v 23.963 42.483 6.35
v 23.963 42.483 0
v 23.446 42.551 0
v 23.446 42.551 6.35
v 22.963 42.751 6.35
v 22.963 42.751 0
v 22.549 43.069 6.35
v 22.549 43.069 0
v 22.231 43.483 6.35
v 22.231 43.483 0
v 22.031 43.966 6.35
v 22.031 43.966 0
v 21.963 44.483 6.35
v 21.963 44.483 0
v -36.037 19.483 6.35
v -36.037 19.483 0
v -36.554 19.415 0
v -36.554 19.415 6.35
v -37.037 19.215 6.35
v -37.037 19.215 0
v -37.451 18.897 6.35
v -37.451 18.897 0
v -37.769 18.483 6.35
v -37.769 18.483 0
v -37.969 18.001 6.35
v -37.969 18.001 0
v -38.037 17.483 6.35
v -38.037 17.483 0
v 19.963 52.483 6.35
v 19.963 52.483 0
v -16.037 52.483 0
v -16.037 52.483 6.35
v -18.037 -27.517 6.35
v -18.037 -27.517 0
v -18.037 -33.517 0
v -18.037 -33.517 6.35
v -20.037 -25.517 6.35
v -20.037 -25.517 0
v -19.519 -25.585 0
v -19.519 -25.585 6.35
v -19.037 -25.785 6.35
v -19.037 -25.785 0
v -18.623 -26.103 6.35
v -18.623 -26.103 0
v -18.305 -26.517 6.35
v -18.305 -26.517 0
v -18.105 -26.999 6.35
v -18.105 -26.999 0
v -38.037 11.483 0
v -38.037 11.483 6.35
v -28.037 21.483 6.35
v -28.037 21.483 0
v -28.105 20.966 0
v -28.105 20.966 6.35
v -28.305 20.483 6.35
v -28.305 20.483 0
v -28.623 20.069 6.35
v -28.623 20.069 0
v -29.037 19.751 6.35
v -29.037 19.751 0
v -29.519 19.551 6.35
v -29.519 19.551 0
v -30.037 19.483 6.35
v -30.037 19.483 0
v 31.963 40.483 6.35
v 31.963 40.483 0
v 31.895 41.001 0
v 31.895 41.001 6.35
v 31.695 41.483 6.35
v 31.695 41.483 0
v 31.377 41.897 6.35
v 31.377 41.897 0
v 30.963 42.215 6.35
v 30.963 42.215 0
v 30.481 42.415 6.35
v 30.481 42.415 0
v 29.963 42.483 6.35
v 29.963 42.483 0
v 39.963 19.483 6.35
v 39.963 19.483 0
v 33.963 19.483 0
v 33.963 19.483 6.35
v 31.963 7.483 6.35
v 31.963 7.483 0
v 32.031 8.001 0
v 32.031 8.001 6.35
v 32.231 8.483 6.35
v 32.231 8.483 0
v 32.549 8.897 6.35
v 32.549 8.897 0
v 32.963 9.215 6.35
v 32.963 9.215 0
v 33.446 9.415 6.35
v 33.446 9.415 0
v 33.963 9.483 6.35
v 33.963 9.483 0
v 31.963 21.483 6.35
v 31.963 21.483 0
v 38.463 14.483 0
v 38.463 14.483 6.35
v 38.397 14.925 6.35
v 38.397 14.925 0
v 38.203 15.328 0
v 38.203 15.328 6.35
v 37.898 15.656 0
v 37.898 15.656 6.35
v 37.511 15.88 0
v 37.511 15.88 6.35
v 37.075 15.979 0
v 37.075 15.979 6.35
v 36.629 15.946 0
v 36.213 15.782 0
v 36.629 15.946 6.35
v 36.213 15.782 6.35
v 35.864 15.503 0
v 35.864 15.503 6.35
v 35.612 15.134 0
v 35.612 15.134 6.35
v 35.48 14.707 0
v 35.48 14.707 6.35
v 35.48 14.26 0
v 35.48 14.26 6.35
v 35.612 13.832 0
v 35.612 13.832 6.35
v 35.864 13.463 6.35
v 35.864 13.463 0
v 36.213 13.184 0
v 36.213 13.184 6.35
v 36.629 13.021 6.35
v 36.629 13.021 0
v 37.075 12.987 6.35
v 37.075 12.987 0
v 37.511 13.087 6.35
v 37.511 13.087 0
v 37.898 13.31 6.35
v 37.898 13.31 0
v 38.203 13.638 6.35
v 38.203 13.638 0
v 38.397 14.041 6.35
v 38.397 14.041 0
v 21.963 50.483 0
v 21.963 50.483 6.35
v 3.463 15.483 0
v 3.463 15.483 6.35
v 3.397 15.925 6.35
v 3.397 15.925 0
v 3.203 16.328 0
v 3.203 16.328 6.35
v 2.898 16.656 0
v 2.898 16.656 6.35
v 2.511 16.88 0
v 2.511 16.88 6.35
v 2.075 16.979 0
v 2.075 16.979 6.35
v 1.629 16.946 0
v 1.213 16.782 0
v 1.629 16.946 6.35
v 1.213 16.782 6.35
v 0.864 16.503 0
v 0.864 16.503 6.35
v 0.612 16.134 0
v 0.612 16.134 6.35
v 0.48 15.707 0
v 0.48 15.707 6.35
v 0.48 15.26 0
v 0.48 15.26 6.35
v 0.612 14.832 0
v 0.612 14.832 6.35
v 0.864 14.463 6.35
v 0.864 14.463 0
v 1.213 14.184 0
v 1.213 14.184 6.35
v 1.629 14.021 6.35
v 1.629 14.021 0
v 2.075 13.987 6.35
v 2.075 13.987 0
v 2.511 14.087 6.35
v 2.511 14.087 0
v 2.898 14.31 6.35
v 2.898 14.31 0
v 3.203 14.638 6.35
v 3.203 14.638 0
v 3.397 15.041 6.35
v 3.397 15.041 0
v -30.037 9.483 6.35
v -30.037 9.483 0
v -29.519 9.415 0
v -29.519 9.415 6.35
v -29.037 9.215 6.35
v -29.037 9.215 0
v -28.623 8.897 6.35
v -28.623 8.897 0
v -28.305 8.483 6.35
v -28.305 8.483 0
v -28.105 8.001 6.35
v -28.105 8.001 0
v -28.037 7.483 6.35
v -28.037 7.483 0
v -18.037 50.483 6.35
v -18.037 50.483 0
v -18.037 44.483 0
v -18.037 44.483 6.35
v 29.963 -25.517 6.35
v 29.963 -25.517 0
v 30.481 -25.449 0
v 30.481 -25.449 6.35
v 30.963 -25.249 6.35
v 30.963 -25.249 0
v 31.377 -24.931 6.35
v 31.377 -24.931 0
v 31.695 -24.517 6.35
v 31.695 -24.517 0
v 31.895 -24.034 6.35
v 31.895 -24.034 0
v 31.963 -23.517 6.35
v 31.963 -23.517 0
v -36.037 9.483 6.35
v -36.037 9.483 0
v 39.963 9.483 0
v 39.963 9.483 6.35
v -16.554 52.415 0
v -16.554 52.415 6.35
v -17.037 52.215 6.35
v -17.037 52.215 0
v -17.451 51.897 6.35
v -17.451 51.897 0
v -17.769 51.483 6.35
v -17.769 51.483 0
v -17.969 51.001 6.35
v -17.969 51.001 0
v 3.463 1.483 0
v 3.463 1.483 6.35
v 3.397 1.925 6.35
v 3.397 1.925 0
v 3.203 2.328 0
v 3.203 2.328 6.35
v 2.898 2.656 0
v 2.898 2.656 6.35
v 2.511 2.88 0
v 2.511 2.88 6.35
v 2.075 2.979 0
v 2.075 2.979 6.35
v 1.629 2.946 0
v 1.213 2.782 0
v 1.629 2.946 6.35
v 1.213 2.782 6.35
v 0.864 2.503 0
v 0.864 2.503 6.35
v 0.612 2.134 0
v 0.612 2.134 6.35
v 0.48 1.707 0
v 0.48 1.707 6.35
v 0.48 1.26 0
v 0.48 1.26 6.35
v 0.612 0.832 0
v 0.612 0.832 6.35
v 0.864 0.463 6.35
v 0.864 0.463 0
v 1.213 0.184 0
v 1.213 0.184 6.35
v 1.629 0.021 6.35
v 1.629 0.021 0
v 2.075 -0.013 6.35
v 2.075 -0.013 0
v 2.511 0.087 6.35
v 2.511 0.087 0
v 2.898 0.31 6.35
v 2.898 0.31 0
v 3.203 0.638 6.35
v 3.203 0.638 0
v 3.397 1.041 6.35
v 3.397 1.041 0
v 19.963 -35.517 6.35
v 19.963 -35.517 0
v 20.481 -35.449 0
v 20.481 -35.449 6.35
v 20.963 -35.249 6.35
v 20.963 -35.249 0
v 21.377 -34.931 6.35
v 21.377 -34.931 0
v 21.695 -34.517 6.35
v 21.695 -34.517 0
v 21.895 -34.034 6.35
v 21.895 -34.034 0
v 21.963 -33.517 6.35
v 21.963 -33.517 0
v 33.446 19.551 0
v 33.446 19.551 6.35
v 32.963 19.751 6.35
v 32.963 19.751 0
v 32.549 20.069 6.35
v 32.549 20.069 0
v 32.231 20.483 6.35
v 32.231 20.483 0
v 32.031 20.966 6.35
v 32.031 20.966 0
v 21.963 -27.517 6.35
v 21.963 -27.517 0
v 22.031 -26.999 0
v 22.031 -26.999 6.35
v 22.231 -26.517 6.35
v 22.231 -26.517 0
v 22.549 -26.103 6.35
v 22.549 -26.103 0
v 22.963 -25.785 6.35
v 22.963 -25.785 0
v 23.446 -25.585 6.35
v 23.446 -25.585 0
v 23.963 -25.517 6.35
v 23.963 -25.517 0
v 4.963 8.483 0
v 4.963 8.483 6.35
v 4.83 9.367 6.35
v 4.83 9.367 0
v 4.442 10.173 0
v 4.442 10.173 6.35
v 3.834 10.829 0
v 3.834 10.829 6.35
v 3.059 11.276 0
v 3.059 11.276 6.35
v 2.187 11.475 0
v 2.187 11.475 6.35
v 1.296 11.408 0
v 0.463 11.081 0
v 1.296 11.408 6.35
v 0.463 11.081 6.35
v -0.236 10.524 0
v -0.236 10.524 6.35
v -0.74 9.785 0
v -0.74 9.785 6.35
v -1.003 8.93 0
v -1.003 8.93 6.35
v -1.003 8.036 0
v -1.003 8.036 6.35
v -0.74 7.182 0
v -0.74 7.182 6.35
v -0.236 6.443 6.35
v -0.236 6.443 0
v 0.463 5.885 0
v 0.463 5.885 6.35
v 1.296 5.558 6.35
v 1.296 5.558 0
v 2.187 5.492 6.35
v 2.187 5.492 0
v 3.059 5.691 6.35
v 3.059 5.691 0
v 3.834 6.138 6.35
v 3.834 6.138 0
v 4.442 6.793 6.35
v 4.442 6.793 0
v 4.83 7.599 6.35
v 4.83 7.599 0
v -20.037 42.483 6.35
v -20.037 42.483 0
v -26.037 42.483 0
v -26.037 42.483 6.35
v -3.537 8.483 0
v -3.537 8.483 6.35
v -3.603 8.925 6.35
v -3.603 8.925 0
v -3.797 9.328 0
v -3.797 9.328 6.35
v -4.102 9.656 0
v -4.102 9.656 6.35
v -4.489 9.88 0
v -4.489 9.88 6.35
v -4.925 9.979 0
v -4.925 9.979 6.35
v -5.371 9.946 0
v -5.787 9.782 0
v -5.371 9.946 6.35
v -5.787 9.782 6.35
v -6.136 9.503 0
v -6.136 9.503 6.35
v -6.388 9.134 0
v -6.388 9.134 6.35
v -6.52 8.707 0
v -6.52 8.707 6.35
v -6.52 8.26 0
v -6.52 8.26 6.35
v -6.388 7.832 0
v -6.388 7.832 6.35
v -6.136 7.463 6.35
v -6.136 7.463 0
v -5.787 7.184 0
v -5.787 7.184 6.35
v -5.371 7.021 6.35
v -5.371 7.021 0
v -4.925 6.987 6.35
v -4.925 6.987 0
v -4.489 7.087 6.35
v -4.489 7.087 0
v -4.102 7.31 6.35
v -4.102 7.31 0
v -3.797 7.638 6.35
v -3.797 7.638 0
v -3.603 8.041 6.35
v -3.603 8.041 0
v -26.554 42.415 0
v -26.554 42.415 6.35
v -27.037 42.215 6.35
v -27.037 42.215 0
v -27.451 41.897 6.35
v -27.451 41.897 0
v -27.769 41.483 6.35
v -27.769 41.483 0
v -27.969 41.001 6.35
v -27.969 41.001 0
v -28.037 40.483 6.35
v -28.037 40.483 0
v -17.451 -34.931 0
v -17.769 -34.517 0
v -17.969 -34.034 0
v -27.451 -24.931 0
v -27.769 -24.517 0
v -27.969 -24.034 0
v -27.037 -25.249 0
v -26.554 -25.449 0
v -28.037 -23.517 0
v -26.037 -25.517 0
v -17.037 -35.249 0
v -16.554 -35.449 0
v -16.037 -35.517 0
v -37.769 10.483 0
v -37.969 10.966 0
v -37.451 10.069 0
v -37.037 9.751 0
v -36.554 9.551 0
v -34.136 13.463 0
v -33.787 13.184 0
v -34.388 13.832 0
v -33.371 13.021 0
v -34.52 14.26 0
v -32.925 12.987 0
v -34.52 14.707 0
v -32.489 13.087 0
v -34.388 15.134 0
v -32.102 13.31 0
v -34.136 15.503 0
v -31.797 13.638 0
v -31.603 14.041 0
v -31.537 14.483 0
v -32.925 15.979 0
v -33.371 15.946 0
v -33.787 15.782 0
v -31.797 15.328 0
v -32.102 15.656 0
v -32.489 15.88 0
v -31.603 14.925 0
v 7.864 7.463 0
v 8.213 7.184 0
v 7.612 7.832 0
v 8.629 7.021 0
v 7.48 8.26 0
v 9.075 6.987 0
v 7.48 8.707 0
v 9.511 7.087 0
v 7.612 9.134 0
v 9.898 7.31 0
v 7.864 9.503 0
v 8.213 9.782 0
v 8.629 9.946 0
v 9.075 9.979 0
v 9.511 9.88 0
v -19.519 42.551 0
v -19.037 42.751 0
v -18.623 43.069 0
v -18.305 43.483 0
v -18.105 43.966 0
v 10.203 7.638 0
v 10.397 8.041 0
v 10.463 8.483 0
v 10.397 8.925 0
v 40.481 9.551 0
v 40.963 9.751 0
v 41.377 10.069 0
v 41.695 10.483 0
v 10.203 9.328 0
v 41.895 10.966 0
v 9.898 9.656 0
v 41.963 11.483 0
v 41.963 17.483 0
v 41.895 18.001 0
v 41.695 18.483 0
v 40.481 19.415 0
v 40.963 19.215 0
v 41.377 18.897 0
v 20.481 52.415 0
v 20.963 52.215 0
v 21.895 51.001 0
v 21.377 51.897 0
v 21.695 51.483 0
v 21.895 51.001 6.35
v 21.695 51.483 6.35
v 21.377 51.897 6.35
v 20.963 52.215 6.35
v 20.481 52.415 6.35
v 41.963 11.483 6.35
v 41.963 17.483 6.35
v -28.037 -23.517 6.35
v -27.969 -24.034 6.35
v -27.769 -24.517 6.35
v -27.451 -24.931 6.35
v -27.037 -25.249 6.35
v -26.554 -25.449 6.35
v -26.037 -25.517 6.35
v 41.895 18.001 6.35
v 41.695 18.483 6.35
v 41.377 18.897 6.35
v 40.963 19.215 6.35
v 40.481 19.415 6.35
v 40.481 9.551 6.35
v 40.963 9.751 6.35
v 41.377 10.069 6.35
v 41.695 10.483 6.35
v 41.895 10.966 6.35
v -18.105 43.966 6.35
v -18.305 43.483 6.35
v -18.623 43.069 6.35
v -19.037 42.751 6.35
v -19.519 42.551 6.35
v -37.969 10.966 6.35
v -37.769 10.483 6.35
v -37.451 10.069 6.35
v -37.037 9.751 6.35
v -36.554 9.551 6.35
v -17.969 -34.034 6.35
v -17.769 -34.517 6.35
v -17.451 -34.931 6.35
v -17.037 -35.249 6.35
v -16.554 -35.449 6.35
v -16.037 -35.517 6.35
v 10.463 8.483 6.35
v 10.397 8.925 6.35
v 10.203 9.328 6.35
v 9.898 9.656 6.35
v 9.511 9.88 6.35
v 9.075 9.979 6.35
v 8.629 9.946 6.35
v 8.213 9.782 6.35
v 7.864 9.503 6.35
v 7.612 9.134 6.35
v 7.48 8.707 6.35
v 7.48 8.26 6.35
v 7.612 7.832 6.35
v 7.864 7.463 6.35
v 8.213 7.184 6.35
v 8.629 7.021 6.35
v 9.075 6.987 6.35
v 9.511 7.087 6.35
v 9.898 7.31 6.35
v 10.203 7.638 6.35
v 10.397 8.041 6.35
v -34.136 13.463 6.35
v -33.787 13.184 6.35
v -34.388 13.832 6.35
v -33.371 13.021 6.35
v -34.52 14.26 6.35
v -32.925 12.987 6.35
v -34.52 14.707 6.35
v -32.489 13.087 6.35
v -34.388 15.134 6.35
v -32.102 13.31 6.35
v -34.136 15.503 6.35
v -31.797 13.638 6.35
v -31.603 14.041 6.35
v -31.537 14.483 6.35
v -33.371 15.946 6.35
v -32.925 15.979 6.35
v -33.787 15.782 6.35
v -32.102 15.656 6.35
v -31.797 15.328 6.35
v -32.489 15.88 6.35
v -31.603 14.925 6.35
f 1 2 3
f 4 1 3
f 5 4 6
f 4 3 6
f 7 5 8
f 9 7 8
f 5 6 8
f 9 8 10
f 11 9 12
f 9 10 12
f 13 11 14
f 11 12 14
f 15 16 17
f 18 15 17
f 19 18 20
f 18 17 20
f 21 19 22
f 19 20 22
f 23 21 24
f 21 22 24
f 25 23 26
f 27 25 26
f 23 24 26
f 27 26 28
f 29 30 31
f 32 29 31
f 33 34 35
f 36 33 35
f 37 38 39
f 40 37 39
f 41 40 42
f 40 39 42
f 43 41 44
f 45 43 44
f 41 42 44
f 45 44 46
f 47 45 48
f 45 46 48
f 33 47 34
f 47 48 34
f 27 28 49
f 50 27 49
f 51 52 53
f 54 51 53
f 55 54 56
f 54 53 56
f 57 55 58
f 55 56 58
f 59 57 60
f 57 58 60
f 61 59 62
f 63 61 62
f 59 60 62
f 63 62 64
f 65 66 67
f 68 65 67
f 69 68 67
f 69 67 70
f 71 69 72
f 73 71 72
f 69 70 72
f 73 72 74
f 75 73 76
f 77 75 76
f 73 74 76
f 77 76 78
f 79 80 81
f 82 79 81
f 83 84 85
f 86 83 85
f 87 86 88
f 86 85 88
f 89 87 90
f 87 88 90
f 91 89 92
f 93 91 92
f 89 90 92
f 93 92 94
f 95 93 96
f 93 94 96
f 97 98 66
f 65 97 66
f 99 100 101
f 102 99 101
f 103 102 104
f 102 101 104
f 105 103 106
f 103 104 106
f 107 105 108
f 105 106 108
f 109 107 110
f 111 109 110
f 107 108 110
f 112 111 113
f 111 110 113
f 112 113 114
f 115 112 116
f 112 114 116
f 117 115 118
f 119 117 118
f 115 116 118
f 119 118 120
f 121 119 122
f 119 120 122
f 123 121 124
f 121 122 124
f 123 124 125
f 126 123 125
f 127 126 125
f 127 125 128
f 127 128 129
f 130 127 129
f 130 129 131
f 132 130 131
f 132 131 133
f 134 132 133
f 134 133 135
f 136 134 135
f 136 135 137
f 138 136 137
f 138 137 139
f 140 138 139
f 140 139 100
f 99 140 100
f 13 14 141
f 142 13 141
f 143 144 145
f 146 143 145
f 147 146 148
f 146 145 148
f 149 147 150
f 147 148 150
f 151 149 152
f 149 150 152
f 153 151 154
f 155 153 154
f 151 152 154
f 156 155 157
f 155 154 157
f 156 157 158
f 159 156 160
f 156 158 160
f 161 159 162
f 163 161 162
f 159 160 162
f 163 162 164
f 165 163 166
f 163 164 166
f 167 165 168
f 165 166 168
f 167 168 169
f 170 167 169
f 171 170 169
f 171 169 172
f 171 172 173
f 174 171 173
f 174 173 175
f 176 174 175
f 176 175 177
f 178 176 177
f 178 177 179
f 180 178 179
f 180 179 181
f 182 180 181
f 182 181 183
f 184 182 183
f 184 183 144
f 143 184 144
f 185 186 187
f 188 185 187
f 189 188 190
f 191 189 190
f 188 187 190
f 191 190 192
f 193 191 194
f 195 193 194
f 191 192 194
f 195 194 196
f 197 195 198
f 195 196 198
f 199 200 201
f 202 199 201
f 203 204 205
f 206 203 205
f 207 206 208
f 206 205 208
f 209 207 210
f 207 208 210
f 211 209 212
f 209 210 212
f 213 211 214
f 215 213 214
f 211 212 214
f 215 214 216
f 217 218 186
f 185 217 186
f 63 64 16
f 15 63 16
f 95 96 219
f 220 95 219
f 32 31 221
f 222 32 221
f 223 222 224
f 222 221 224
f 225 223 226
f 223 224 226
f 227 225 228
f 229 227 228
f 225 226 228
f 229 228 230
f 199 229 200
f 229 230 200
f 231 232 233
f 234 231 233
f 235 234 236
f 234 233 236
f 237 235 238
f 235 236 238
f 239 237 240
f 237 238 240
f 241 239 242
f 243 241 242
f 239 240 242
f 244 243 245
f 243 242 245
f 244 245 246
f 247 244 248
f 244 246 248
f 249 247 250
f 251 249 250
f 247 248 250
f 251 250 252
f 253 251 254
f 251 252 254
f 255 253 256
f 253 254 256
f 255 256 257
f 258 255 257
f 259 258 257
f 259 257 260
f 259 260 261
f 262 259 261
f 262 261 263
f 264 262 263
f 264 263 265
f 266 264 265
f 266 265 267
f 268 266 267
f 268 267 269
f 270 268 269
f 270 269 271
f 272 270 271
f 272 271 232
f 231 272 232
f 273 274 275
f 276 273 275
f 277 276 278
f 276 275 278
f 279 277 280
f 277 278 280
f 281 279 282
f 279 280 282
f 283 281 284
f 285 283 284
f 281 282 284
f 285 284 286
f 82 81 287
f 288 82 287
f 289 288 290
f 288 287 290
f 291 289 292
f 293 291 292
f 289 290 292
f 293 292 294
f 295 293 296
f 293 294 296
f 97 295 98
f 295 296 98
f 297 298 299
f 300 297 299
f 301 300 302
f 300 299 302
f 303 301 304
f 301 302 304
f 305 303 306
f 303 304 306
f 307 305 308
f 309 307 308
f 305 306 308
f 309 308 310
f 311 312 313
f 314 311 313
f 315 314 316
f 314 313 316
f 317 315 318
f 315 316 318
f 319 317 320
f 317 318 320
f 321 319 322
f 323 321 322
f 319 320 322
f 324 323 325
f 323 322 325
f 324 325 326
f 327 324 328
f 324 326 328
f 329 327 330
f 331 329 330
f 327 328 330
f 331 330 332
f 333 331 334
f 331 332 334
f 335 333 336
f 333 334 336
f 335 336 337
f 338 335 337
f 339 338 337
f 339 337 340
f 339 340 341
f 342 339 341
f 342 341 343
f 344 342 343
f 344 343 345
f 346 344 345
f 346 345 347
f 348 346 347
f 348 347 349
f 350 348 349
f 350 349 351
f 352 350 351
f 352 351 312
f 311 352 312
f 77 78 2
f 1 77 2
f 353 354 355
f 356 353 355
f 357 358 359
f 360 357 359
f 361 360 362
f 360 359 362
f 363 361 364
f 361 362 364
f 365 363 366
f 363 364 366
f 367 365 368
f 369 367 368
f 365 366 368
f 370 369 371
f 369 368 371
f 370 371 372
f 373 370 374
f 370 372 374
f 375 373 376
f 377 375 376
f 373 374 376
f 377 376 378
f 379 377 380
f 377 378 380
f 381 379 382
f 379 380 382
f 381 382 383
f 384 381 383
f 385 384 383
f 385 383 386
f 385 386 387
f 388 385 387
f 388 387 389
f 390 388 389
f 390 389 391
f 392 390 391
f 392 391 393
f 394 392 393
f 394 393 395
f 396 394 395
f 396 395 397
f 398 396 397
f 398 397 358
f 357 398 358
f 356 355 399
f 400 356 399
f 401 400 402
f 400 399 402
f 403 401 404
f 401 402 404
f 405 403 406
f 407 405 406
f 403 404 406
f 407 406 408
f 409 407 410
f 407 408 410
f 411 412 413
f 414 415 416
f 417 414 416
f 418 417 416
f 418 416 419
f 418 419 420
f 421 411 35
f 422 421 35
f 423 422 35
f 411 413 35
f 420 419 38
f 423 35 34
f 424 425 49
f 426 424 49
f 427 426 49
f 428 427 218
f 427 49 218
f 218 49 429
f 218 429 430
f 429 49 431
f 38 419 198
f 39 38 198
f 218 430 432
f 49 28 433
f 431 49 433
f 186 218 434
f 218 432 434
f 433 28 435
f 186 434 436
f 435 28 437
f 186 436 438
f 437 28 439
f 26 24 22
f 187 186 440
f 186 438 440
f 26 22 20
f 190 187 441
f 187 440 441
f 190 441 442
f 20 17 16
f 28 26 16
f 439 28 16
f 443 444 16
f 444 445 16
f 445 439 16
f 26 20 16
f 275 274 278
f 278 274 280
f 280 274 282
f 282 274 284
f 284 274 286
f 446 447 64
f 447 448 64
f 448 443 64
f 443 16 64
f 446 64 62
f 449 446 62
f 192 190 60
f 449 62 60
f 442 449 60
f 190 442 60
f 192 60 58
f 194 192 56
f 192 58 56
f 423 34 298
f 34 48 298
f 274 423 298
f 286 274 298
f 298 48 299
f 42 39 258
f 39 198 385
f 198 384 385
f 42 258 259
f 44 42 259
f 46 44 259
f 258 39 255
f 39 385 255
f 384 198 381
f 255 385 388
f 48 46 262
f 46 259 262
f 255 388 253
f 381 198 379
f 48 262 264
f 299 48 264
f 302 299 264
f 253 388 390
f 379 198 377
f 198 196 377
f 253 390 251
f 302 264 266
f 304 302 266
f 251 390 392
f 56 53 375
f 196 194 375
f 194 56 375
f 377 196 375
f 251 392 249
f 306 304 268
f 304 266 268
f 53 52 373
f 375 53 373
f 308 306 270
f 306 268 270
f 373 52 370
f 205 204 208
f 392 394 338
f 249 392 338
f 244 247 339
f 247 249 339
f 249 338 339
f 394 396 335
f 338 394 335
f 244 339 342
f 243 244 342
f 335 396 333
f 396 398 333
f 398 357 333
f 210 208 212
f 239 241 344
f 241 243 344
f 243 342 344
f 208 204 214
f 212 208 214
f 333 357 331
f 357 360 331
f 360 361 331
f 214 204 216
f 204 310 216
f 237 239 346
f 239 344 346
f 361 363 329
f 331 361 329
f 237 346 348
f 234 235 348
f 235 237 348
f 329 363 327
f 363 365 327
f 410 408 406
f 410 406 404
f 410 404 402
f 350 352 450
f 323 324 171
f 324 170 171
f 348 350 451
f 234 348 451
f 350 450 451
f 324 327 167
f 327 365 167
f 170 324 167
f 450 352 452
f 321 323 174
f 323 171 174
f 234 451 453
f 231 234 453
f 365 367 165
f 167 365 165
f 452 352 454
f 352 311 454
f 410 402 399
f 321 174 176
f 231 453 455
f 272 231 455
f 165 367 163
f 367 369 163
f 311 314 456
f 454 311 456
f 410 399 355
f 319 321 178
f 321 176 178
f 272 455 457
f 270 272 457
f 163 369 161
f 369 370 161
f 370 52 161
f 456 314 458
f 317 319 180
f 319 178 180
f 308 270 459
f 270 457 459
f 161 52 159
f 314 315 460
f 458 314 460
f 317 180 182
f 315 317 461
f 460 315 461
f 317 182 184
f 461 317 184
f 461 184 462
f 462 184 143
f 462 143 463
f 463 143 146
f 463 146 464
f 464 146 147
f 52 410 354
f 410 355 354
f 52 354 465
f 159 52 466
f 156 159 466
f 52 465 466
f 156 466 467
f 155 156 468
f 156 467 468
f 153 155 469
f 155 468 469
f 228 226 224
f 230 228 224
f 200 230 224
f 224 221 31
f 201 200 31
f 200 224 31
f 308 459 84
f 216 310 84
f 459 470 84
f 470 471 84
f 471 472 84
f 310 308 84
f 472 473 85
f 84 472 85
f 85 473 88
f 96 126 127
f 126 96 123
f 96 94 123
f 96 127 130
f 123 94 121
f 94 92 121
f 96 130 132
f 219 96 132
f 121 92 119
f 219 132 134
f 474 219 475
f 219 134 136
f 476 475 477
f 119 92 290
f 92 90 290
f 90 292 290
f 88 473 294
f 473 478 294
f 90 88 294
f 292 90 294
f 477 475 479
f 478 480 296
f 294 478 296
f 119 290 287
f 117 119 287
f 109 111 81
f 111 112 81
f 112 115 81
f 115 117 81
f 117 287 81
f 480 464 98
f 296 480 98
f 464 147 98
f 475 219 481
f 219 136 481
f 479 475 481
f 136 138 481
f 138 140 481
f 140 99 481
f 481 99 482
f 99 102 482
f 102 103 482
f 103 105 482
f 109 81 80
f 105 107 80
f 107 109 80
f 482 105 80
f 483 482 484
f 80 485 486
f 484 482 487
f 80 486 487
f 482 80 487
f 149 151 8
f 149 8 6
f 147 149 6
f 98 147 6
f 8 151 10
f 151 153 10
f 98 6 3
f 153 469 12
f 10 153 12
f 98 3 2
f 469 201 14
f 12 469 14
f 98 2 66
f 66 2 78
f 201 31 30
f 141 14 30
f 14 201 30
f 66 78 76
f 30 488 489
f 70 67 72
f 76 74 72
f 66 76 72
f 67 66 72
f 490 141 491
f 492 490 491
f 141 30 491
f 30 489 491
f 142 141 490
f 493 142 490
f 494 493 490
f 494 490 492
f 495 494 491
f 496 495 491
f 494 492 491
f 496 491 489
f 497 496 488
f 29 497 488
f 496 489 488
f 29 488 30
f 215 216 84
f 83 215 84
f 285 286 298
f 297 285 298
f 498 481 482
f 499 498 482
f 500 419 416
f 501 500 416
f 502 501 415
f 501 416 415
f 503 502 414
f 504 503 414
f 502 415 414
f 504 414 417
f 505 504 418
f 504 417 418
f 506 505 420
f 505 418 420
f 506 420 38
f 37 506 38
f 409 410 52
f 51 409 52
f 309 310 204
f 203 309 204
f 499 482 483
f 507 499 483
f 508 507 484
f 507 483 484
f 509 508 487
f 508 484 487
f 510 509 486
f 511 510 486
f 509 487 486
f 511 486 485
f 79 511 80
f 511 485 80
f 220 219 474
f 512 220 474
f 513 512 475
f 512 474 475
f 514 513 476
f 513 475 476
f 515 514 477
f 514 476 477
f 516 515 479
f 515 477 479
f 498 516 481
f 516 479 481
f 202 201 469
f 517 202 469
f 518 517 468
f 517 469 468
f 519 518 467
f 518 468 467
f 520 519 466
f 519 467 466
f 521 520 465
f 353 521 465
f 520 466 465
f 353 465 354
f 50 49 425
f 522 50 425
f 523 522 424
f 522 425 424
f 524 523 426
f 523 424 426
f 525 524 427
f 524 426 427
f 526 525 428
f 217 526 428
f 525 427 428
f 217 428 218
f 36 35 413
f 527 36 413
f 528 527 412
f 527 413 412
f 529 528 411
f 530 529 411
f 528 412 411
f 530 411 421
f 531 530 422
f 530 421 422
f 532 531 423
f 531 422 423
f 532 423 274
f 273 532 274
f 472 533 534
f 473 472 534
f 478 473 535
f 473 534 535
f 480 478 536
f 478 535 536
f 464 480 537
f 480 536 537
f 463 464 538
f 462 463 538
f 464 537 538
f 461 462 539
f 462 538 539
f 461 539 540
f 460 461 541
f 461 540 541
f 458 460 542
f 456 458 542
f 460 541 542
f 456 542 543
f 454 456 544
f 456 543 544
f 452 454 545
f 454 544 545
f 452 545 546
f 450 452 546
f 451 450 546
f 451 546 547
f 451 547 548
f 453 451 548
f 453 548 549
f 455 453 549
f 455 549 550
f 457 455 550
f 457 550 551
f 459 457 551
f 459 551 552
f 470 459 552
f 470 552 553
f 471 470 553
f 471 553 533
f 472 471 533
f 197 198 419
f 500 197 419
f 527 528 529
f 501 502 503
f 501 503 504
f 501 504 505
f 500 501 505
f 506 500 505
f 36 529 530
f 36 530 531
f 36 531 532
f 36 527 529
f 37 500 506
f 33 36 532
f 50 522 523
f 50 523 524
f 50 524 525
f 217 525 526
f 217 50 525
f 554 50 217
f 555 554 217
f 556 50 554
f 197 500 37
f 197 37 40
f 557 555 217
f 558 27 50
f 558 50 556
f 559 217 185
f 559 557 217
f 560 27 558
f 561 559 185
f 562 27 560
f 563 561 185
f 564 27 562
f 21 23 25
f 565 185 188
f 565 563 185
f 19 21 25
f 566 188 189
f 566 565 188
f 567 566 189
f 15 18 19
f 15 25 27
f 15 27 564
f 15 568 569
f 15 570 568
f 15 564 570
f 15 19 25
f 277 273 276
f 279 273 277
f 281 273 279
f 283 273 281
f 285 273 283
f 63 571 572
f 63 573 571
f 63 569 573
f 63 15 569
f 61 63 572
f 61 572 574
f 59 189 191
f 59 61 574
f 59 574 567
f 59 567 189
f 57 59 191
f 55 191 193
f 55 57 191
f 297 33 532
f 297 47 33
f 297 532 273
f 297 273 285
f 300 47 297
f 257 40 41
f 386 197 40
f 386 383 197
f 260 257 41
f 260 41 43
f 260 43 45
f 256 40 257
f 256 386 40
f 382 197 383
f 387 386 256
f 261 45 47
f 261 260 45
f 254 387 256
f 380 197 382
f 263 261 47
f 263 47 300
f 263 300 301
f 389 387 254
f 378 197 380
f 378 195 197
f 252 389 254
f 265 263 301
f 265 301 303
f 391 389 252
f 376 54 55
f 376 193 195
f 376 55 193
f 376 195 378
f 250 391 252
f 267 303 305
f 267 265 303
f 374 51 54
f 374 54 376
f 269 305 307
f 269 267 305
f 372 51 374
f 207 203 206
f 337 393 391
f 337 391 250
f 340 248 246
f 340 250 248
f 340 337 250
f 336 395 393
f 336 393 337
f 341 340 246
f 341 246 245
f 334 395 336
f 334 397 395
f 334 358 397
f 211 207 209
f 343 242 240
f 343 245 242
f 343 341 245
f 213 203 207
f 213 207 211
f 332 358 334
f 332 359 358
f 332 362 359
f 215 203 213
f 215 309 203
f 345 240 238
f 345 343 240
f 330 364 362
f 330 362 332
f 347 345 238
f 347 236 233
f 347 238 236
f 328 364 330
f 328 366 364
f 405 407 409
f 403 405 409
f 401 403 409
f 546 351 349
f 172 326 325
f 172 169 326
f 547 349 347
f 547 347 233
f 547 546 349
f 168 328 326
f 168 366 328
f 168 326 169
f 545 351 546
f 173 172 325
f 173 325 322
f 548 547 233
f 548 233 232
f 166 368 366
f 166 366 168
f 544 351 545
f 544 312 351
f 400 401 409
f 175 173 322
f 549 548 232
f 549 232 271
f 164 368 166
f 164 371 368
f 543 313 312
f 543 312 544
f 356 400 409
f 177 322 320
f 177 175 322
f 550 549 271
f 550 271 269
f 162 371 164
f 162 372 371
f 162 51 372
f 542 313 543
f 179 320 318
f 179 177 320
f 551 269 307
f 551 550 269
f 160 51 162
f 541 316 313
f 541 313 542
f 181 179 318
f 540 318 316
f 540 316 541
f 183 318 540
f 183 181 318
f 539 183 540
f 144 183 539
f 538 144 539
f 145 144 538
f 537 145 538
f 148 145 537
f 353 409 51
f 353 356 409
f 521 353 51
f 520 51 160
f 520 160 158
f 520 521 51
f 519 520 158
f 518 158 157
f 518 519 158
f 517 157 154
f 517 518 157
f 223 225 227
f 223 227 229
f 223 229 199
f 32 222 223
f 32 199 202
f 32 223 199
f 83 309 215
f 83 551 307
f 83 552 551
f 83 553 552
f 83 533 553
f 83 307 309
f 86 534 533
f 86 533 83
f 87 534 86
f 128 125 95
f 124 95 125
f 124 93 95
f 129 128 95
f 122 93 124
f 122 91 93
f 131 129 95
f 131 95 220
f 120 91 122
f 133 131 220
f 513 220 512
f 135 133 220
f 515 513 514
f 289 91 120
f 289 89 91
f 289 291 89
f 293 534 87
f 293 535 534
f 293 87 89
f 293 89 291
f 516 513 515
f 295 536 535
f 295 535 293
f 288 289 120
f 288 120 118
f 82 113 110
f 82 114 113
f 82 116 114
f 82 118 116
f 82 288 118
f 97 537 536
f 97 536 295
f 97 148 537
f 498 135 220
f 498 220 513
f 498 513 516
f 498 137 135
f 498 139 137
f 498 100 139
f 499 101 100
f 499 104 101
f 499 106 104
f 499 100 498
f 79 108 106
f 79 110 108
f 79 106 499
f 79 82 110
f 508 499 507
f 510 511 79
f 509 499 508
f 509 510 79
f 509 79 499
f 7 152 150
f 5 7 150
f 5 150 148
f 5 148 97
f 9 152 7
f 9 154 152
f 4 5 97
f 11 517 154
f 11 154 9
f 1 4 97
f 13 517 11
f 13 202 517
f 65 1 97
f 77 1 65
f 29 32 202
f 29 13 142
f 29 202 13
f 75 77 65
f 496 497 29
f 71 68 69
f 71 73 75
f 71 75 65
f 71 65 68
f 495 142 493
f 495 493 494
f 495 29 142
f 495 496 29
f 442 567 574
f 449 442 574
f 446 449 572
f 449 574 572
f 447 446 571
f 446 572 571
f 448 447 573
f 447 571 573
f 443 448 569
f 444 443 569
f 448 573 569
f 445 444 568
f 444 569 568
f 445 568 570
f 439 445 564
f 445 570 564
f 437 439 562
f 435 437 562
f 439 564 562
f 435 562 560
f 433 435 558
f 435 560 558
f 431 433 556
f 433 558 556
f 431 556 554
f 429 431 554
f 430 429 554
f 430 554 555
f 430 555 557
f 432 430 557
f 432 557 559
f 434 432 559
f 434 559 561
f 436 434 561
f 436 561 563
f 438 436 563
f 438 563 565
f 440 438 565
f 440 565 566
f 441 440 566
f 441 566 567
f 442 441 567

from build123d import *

# Parameters (mm, degrees)
EXTRUDE_1_DEPTH     = 6.35
SKETCH_2_R          = 1.5
CUT_EXTRUDE_1_DEPTH = 7.35
SKETCH_3_R          = 3
SKETCH_3_R_2        = 1.5
CUT_EXTRUDE_2_DEPTH = 7.35


with BuildPart() as part:
    # 草图1 → 凸台-拉伸1 (new body)
    with BuildSketch(Plane.XY):
        with BuildLine():
            Line((-28.036772487, 40.483201058), (-28.036772487, 21.483201058))
            ThreePointArc((-28.036772487, 21.483201058), (-28.622558924, 20.068987496), (-30.036772487, 19.483201058))
            Line((-30.036772487, 19.483201058), (-36.036772487, 19.483201058))
            ThreePointArc((-36.036772487, 19.483201058), (-37.450986049, 18.897414621), (-38.036772487, 17.483201058))
            Line((-38.036772487, 17.483201058), (-38.036772487, 11.483201058))
            ThreePointArc((-38.036772487, 11.483201058), (-37.450986049, 10.068987496), (-36.036772487, 9.483201058))
            Line((-36.036772487, 9.483201058), (-30.036772487, 9.483201058))
            ThreePointArc((-30.036772487, 9.483201058), (-28.622558924, 8.897414621), (-28.036772487, 7.483201058))
            Line((-28.036772487, 7.483201058), (-28.036772487, -23.516798942))
            ThreePointArc((-28.036772487, -23.516798942), (-27.450986049, -24.931012504), (-26.036772487, -25.516798942))
            Line((-26.036772487, -25.516798942), (-20.036772487, -25.516798942))
            ThreePointArc((-20.036772487, -25.516798942), (-18.622558924, -26.102585379), (-18.036772487, -27.516798942))
            Line((-18.036772487, -27.516798942), (-18.036772487, -33.516798942))
            ThreePointArc((-18.036772487, -33.516798942), (-17.450986049, -34.931012504), (-16.036772487, -35.516798942))
            Line((-16.036772487, -35.516798942), (19.963227513, -35.516798942))
            ThreePointArc((19.963227513, -35.516798942), (21.377441076, -34.931012504), (21.963227513, -33.516798942))
            Line((21.963227513, -33.516798942), (21.963227513, -27.516798942))
            ThreePointArc((21.963227513, -27.516798942), (22.549013951, -26.102585379), (23.963227513, -25.516798942))
            Line((23.963227513, -25.516798942), (29.963227513, -25.516798942))
            ThreePointArc((29.963227513, -25.516798942), (31.377441076, -24.931012504), (31.963227513, -23.516798942))
            Line((31.963227513, -23.516798942), (31.963227513, 7.483201058))
            ThreePointArc((31.963227513, 7.483201058), (32.549013951, 8.897414621), (33.963227513, 9.483201058))
            Line((33.963227513, 9.483201058), (39.963227513, 9.483201058))
            ThreePointArc((39.963227513, 9.483201058), (41.377441076, 10.068987496), (41.963227513, 11.483201058))
            Line((41.963227513, 11.483201058), (41.963227513, 17.483201058))
            ThreePointArc((41.963227513, 17.483201058), (41.377441076, 18.897414621), (39.963227513, 19.483201058))
            Line((39.963227513, 19.483201058), (33.963227513, 19.483201058))
            ThreePointArc((33.963227513, 19.483201058), (32.549013951, 20.068987496), (31.963227513, 21.483201058))
            Line((31.963227513, 21.483201058), (31.963227513, 40.483201058))
            ThreePointArc((31.963227513, 40.483201058), (31.377441076, 41.897414621), (29.963227513, 42.483201058))
            Line((29.963227513, 42.483201058), (23.963227513, 42.483201058))
            ThreePointArc((23.963227513, 42.483201058), (22.549013951, 43.068987496), (21.963227513, 44.483201058))
            Line((21.963227513, 44.483201058), (21.963227513, 50.483201058))
            ThreePointArc((21.963227513, 50.483201058), (21.377441076, 51.897414621), (19.963227513, 52.483201058))
            Line((19.963227513, 52.483201058), (-16.036772487, 52.483201058))
            ThreePointArc((-16.036772487, 52.483201058), (-17.450986049, 51.897414621), (-18.036772487, 50.483201058))
            Line((-18.036772487, 50.483201058), (-18.036772487, 44.483201058))
            ThreePointArc((-18.036772487, 44.483201058), (-18.622558924, 43.068987496), (-20.036772487, 42.483201058))
            Line((-20.036772487, 42.483201058), (-26.036772487, 42.483201058))
            ThreePointArc((-26.036772487, 42.483201058), (-27.450986049, 41.897414621), (-28.036772487, 40.483201058))
        make_face()
    extrude(amount=EXTRUDE_1_DEPTH)

    # 草图2 → 切除-拉伸1 (cut, through all)
    with BuildSketch(Plane.XY.offset(6.35)):
        with Locations((-33.036772487, 14.483201058)):
            Circle(SKETCH_2_R)
        with Locations((36.963227513, 14.483201058)):
            Circle(SKETCH_2_R)
    extrude(amount=-CUT_EXTRUDE_1_DEPTH, mode=Mode.SUBTRACT)

    # 草图3 → 切除-拉伸2 (cut, through all)
    with BuildSketch(Plane.XY.offset(6.35)):
        with Locations((1.963227513, 8.483201058)):
            Circle(SKETCH_3_R)
        with Locations((8.963227513, 8.483201058)):
            Circle(SKETCH_3_R_2)
        with Locations((1.963227513, 15.483201058)):
            Circle(SKETCH_3_R_2)
        with Locations((-5.036772487, 8.483201058)):
            Circle(SKETCH_3_R_2)
        with Locations((1.963227513, 1.483201058)):
            Circle(SKETCH_3_R_2)
    extrude(amount=-CUT_EXTRUDE_2_DEPTH, mode=Mode.SUBTRACT)


solid = part.part
